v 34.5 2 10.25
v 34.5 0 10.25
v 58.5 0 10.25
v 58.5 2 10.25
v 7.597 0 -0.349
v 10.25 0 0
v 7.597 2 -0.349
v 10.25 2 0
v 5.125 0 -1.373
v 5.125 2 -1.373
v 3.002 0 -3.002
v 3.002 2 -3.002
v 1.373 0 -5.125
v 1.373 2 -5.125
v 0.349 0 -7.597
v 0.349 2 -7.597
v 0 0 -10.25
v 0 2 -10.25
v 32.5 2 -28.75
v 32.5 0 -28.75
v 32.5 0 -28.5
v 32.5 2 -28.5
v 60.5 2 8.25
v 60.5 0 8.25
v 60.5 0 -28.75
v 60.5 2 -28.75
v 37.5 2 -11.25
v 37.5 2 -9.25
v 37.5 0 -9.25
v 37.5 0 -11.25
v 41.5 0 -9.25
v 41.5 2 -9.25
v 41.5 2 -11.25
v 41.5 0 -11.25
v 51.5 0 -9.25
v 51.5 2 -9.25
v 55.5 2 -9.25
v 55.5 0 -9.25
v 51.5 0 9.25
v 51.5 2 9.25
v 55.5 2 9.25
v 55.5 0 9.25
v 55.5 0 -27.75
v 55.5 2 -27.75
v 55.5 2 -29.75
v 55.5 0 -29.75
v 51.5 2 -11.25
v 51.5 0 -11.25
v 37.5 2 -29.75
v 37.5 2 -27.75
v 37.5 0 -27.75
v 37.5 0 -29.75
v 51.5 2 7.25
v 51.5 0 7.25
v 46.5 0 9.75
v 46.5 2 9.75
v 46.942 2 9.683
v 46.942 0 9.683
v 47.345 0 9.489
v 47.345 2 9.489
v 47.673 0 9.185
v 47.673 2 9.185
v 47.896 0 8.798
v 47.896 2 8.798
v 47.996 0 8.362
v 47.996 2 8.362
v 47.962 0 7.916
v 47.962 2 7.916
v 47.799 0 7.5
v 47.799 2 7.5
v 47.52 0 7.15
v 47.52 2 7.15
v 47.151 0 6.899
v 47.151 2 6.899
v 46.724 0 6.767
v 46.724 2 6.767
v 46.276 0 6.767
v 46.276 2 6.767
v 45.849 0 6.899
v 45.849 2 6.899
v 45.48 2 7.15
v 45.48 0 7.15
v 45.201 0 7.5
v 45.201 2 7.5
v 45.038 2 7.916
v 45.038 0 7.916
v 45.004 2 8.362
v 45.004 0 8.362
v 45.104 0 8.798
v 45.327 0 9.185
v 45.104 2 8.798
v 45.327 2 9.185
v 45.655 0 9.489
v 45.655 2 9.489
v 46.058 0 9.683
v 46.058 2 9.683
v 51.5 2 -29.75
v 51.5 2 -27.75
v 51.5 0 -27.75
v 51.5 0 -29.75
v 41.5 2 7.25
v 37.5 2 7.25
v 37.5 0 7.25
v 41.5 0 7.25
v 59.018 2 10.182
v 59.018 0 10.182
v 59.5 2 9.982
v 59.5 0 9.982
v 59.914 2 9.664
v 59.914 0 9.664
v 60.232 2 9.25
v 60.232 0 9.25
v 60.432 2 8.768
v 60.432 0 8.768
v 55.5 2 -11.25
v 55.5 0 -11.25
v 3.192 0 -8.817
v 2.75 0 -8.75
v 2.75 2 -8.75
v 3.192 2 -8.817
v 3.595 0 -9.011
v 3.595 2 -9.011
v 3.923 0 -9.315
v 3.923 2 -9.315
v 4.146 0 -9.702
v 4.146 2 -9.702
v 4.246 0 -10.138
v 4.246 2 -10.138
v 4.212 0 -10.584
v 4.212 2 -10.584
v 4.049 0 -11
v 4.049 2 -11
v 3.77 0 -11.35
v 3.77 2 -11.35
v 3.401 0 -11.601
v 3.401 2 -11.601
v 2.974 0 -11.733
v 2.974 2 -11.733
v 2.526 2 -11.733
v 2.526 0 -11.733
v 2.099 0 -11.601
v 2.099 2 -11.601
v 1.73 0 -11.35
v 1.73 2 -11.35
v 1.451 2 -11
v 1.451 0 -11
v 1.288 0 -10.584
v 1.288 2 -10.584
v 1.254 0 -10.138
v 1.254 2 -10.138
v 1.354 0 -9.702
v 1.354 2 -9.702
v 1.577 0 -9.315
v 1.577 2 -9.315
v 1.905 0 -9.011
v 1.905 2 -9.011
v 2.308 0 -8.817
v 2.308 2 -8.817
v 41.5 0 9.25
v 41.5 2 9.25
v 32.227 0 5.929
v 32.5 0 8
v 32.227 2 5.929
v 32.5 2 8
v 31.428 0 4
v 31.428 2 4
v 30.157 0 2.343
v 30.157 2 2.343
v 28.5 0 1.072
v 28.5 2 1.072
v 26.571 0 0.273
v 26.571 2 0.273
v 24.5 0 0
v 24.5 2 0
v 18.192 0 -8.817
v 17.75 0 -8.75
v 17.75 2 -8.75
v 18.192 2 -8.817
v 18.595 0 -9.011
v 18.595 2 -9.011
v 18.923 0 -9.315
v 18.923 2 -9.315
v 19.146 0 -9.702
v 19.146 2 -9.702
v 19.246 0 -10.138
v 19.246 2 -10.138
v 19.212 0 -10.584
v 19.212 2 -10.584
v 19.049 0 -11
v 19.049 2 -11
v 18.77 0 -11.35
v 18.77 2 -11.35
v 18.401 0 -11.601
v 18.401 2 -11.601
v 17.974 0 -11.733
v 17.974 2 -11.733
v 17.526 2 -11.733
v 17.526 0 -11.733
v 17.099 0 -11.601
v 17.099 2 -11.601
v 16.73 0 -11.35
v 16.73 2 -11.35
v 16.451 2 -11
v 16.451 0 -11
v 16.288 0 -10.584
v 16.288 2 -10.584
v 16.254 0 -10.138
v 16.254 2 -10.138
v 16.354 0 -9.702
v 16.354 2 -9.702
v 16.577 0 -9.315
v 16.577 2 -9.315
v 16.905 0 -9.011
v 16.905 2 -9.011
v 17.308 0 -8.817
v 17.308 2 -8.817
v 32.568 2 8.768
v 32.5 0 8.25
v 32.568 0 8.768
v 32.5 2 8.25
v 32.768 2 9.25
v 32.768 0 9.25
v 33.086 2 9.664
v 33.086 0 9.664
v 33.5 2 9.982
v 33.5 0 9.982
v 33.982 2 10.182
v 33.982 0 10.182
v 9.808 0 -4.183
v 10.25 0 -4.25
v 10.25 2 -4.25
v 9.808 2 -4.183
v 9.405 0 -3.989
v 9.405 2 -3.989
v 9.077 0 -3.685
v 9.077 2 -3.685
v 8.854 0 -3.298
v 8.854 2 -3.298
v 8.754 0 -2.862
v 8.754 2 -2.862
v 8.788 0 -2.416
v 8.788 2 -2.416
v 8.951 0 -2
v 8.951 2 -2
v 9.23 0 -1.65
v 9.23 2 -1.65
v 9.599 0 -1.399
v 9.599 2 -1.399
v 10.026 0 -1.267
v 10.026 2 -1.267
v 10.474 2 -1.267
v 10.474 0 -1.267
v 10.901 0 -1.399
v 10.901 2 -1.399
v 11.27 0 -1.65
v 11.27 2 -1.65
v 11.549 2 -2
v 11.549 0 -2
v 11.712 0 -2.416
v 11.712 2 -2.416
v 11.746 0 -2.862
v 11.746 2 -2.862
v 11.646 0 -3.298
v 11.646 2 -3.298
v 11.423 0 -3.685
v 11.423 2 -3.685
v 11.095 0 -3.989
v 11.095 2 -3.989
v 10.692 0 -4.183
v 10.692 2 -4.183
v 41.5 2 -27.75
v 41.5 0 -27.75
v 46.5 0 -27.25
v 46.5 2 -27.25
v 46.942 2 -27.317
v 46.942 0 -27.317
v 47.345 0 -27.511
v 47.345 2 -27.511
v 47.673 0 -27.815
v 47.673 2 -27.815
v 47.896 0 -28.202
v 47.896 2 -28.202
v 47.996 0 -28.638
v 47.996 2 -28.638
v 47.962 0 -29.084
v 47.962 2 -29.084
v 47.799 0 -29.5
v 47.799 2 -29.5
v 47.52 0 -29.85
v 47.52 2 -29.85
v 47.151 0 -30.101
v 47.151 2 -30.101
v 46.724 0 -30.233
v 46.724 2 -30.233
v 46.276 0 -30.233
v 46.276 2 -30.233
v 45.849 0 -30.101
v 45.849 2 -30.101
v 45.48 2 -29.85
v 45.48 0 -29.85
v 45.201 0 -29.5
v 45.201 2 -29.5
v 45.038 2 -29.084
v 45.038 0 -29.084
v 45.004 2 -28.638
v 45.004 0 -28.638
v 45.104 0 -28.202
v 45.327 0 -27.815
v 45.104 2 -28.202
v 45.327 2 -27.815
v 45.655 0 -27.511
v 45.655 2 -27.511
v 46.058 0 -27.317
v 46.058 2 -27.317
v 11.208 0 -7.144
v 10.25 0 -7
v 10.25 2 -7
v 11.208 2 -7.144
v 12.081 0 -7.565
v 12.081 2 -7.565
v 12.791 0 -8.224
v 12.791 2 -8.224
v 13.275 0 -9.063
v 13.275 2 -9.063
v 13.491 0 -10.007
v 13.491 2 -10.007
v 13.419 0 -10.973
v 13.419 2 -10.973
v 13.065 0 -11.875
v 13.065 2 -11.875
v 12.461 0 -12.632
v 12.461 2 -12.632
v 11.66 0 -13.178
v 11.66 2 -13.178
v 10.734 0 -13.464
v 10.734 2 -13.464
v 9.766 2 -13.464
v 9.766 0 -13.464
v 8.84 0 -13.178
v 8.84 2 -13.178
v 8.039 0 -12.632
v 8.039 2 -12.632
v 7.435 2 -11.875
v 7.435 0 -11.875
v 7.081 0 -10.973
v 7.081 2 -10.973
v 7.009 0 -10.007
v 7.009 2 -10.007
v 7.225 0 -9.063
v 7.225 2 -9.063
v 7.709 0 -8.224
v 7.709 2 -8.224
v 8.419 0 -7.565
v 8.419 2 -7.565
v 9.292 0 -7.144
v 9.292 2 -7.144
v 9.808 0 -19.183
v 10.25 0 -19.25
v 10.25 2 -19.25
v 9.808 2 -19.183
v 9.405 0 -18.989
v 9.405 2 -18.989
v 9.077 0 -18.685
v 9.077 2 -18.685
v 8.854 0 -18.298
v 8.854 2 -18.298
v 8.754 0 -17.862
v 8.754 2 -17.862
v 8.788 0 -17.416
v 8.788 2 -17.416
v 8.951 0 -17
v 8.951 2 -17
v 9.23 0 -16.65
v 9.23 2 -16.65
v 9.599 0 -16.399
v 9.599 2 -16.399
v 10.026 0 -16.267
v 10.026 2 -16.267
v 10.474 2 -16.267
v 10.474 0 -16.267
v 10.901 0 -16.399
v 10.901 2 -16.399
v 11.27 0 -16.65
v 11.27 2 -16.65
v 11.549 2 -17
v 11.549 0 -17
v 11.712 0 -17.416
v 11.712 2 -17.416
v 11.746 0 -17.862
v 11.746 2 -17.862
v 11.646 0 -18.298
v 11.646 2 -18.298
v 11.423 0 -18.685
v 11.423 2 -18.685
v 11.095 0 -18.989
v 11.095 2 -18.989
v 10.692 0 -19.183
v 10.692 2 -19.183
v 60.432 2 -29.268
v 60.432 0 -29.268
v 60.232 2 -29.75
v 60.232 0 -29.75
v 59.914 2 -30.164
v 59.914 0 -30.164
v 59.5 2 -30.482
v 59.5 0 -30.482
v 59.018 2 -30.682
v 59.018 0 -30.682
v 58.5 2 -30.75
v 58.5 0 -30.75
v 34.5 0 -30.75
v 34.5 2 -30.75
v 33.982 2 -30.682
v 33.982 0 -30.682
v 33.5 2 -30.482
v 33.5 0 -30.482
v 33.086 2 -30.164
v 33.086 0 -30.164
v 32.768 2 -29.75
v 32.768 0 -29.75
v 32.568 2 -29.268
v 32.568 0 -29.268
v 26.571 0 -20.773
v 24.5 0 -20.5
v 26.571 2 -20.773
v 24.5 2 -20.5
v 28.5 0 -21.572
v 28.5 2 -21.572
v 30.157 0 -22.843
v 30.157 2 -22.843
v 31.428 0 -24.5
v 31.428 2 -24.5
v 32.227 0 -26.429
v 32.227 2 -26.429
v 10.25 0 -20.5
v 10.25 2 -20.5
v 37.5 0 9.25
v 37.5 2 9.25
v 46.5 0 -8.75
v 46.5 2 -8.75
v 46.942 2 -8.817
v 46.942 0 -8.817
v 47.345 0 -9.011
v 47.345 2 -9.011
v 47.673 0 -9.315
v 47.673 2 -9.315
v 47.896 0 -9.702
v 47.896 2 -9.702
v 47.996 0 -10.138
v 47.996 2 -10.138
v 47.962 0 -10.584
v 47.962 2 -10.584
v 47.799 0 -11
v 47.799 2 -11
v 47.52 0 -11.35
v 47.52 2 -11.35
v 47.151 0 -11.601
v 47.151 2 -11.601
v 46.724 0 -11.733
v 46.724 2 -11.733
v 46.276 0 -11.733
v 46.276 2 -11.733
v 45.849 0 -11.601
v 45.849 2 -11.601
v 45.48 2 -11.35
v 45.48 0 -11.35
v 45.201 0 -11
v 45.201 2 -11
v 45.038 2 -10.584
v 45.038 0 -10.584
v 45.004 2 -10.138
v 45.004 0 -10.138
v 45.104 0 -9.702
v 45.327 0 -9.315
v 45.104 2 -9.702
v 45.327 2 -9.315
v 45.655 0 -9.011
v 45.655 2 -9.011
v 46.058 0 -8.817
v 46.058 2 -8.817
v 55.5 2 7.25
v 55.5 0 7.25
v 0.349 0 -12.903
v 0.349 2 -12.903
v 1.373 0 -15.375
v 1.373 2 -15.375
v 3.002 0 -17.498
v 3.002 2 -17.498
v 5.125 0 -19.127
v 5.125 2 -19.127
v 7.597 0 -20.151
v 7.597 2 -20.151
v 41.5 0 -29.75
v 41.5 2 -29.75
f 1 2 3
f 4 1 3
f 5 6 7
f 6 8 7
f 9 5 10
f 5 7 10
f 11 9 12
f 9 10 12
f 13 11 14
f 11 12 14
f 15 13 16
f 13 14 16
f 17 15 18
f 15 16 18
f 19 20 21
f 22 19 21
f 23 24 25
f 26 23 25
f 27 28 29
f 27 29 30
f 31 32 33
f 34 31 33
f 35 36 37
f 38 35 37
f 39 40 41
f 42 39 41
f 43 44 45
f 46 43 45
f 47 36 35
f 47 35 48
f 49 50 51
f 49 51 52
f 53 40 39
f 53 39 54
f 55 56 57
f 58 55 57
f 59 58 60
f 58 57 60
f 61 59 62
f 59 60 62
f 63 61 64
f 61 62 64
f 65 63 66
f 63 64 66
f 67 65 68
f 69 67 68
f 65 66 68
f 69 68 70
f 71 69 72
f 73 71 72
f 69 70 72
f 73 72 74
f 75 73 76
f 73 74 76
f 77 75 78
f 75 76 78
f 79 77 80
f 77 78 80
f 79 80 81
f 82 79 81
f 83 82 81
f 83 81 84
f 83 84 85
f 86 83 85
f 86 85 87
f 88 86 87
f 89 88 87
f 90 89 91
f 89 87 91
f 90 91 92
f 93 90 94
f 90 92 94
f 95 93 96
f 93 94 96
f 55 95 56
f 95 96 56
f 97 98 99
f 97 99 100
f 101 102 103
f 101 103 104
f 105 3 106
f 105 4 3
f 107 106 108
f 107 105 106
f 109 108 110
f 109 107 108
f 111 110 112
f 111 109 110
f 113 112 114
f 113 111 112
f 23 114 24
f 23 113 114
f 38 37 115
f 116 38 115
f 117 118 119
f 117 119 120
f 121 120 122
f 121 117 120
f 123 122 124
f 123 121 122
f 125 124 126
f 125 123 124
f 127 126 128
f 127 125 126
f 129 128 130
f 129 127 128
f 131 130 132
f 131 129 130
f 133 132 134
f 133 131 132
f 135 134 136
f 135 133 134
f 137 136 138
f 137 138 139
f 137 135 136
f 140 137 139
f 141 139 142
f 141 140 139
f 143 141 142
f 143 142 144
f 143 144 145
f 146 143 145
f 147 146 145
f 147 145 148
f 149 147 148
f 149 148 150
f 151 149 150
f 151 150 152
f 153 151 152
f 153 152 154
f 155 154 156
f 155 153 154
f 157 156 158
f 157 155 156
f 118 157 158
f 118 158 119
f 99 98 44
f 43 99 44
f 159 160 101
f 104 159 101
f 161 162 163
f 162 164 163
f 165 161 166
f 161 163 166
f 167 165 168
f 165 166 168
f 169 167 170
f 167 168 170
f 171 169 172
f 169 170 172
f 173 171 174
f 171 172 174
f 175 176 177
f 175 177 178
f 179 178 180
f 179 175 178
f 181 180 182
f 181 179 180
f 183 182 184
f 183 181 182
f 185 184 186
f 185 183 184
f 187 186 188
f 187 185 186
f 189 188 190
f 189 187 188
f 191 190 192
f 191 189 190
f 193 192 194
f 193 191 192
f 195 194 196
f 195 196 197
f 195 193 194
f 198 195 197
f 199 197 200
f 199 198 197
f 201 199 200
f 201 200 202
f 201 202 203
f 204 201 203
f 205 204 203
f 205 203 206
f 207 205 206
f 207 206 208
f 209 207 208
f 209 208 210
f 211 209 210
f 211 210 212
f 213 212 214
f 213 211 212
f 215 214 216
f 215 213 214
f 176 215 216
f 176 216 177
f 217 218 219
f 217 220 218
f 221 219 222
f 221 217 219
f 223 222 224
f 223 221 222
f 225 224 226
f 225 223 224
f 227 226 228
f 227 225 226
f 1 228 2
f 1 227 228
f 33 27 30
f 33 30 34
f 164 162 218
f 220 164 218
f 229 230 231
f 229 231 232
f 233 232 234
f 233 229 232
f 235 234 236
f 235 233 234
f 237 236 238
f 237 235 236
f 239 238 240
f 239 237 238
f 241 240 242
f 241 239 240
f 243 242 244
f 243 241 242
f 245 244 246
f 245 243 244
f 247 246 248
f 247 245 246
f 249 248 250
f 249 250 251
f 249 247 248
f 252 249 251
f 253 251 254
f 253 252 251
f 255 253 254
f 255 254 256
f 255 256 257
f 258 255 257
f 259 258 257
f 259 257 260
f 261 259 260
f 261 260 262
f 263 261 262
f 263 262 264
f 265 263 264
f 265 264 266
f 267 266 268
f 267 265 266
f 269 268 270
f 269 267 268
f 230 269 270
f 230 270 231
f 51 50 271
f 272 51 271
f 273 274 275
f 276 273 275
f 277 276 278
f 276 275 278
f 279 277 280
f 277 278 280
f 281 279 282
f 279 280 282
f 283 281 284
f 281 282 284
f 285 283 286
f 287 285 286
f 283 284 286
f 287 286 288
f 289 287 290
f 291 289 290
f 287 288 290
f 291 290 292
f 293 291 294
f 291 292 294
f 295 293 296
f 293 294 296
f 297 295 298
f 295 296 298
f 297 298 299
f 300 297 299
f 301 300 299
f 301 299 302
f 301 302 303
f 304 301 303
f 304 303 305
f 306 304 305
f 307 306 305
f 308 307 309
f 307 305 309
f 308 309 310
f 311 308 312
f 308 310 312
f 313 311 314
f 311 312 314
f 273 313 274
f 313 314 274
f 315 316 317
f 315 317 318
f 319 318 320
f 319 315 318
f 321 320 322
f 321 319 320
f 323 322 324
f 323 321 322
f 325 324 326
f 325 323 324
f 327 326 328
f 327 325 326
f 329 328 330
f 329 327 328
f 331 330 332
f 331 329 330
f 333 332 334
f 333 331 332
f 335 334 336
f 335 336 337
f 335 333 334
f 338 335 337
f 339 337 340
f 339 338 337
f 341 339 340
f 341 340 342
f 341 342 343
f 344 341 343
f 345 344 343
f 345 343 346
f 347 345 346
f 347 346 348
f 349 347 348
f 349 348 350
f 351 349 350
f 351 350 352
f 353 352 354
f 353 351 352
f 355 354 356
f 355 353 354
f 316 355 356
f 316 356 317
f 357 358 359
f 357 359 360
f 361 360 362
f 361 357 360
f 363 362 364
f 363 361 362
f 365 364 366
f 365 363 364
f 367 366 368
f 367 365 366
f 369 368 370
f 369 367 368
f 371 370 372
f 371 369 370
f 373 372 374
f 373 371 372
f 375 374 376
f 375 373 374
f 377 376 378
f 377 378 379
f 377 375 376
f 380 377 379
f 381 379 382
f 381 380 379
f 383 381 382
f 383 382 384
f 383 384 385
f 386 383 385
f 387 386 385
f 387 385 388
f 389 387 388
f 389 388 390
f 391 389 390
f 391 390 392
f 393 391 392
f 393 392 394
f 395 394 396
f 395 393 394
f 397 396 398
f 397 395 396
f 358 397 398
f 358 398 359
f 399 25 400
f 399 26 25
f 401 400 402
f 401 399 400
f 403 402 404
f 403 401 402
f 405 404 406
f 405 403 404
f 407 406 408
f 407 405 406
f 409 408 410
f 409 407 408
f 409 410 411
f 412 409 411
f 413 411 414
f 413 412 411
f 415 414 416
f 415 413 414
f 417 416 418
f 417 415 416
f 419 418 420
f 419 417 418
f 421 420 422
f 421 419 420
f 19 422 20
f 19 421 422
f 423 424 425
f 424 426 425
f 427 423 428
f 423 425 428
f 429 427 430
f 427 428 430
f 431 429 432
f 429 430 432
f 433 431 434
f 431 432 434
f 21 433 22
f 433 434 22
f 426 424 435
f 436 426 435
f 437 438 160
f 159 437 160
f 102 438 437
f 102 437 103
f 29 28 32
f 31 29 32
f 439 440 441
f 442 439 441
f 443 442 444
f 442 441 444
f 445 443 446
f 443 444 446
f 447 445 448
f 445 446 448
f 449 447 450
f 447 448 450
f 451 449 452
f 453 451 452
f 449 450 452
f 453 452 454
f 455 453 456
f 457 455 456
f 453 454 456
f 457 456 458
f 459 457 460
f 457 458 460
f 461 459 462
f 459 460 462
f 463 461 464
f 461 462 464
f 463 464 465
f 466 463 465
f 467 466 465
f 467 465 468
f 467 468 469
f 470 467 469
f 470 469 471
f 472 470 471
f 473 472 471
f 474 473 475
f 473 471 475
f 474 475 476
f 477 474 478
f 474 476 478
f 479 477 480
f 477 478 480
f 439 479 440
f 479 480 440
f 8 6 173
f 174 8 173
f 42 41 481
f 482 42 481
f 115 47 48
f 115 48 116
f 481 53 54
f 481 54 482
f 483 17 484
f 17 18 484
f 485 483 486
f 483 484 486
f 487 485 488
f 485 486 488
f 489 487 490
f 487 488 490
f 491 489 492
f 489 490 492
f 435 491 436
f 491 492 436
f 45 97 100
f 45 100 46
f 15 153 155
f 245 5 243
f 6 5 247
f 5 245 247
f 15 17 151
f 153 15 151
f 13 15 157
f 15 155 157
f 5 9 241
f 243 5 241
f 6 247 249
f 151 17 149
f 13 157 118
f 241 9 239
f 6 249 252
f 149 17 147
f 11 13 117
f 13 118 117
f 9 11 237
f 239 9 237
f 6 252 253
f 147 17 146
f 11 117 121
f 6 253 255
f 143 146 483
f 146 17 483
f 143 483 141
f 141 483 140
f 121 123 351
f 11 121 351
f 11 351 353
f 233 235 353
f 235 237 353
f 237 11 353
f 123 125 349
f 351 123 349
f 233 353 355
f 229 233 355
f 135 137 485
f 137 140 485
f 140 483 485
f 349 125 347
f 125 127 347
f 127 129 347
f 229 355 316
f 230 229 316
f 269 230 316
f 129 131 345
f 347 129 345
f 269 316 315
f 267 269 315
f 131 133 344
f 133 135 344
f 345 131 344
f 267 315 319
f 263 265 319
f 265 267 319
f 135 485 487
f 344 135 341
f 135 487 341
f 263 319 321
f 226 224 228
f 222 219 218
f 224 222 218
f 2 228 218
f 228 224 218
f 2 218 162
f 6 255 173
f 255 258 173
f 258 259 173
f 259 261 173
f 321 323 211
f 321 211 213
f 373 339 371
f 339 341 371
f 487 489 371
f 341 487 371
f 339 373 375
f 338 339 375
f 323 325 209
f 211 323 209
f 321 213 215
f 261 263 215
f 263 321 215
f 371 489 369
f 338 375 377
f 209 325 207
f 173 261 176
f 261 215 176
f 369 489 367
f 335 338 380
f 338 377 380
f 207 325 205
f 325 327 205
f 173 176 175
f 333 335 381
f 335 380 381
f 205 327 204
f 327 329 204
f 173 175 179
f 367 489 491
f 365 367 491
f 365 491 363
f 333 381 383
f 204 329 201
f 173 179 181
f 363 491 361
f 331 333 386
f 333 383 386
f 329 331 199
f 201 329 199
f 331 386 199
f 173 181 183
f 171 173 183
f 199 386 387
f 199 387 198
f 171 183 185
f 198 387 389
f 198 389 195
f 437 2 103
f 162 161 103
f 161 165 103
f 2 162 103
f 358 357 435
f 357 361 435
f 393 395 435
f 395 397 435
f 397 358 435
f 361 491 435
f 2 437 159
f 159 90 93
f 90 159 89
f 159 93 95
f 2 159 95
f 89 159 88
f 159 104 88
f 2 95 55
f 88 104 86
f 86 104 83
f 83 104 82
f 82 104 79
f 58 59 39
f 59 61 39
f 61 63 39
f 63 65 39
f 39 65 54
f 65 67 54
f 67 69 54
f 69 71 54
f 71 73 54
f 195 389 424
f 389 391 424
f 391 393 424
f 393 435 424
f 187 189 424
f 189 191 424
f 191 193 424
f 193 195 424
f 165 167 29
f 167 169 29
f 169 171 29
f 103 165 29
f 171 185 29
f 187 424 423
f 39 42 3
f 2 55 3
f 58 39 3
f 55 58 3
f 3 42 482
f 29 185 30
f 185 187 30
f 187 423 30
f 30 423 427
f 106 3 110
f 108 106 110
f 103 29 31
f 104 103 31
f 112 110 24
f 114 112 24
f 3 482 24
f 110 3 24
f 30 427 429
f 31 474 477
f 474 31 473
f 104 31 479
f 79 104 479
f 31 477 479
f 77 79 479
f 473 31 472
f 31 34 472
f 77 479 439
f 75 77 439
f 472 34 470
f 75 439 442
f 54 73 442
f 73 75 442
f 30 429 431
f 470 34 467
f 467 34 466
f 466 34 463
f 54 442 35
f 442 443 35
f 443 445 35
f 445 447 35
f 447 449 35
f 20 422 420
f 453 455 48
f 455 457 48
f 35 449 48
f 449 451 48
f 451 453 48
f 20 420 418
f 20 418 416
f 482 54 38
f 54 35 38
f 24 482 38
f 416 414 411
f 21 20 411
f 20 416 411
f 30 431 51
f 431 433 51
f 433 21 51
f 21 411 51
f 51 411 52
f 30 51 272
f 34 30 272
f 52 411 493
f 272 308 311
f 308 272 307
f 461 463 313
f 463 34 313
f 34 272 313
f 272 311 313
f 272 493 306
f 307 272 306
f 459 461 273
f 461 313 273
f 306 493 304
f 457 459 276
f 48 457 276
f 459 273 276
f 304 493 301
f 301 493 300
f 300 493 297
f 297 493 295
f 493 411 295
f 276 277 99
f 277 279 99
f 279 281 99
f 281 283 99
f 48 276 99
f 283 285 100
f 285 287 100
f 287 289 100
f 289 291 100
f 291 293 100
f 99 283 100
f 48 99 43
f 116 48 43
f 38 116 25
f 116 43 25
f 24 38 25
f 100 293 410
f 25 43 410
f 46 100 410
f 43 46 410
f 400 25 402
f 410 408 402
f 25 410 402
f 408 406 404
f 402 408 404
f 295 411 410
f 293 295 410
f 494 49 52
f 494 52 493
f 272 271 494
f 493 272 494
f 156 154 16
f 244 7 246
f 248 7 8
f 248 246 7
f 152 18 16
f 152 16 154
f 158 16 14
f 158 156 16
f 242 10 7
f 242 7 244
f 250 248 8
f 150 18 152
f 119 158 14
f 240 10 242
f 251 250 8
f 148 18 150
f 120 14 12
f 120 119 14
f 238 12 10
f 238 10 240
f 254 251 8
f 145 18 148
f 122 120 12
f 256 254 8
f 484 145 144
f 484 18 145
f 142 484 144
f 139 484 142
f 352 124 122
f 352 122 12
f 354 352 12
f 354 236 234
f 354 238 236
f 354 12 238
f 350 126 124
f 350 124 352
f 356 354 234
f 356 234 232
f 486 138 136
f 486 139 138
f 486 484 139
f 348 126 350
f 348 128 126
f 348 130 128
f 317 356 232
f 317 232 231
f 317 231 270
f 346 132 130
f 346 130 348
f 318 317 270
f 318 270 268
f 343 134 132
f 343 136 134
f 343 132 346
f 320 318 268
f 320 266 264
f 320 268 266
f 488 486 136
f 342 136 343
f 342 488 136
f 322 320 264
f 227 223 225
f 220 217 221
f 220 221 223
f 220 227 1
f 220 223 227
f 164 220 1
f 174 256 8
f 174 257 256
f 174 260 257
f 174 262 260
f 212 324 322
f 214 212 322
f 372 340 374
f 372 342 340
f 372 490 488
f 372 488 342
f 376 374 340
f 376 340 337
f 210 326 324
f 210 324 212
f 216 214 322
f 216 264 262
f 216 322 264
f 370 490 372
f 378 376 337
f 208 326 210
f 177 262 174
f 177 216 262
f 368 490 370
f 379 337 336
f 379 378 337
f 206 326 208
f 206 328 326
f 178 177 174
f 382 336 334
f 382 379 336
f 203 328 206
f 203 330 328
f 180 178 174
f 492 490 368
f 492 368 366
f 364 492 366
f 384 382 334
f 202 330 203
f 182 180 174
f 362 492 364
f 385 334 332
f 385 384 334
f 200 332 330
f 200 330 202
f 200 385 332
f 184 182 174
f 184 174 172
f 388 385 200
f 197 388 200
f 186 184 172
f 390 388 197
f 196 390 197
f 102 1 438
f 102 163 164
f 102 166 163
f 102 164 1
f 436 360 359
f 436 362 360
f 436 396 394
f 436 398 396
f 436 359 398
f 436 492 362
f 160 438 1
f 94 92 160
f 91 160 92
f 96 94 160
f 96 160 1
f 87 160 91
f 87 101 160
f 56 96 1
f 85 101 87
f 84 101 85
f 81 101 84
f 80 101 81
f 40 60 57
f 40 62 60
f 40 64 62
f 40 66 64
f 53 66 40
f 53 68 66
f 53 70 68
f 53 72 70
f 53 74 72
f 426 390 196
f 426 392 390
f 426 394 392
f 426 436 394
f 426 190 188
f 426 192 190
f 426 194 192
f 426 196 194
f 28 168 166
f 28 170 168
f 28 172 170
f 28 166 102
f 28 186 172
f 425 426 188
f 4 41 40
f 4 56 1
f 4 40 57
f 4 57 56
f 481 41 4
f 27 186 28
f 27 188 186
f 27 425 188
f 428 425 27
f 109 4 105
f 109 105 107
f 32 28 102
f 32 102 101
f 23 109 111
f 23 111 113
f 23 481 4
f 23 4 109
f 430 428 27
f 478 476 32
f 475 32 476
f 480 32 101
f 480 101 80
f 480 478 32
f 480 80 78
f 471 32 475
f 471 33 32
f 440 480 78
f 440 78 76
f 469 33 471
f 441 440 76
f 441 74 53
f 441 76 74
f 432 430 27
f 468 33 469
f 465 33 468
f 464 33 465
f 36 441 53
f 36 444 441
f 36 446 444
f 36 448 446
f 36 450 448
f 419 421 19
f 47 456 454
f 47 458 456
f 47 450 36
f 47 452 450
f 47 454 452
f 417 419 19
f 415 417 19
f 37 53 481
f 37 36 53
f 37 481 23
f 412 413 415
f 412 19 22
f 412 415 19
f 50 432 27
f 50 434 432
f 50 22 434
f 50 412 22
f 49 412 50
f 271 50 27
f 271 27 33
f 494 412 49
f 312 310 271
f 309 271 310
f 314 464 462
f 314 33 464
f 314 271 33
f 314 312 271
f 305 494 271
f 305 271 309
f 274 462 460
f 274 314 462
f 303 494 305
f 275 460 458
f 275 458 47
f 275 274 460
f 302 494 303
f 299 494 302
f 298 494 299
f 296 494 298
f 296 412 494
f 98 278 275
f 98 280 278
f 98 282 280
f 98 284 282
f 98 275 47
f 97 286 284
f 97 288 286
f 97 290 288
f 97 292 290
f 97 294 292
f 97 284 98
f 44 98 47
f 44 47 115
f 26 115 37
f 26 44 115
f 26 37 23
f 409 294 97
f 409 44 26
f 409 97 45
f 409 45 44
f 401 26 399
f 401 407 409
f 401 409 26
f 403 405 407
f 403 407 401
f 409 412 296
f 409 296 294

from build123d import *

# Parameters (mm, degrees)
SKETCH1_R           = 3.25
SKETCH1_R_2         = 1.5
BOSS_EXTRUDE1_DEPTH = 2
FILLET1_R           = 10.25
FILLET2_R           = 2
SKETCH2_R           = 1.5
SKETCH2_W           = 4
SKETCH2_H           = 2
CUT_EXTRUDE1_DEPTH  = 2
FILLET3_R           = 8


with BuildPart() as part:
    # Sketch1 → Boss-Extrude1 (new body)
    with BuildSketch(Plane(origin=(0, 0, 0), x_dir=(1, 0, 0), z_dir=(0, 1, 0))):
        Polygon((0, 0), (32.5, 0), (32.5, -10.25), (60.5, -10.25), (60.5, -0.75), (60.5, 21.25), (60.5, 30.75), (32.5, 30.75), (32.5, 20.5), (0, 20.5), align=None)
        with Locations(Location((10.25, 10.25, 0), (0, 0, 270))):
            Circle(SKETCH1_R, mode=Mode.SUBTRACT)
        with Locations(Location((2.75, 10.25, 0), (0, 0, 270))):
            Circle(SKETCH1_R_2, mode=Mode.SUBTRACT)
        with Locations(Location((10.25, 17.75, 0), (0, 0, 90))):
            Circle(SKETCH1_R_2, mode=Mode.SUBTRACT)
        with Locations(Location((17.75, 10.25, 0), (0, 0, 270))):
            Circle(SKETCH1_R_2, mode=Mode.SUBTRACT)
        with Locations(Location((10.25, 2.75, 0), (0, 0, 90))):
            Circle(SKETCH1_R_2, mode=Mode.SUBTRACT)
    extrude(amount=BOSS_EXTRUDE1_DEPTH)

    # Fillet1
    fillet1_edges = [part.edges().sort_by_distance(p)[0] for p in [
        (0, 1, -20.5),
        (0, 1, 0),
    ]]
    fillet(fillet1_edges, radius=FILLET1_R - 0.0001)  # a hair under: the kernel refuses the full size

    # Fillet2
    fillet2_edges = [part.edges().sort_by_distance(p)[0] for p in [
        (32.5, 1, -30.75),
        (60.5, 1, -30.75),
        (60.5, 1, 10.25),
        (32.5, 1, 10.25),
    ]]
    fillet(fillet2_edges, radius=FILLET2_R)

    # Sketch2 → Cut-Extrude1 (cut)
    with BuildSketch(Plane(origin=(0, 2, 0), x_dir=(1, 0, 0), z_dir=(0, 1, 0))):
        with Locations(Location((46.5, 28.75, 0), (0, 0, 270))):
            Circle(SKETCH2_R)
        with Locations(Location((46.5, 10.25, 0), (0, 0, 270))):
            Circle(SKETCH2_R)
        with Locations(Location((46.5, -8.25, 0), (0, 0, 270))):
            Circle(SKETCH2_R)
        with Locations((39.5, 28.75)):
            Rectangle(SKETCH2_W, SKETCH2_H)
        with Locations((53.5, 28.75)):
            Rectangle(SKETCH2_W, SKETCH2_H)
        with Locations((39.5, 10.25)):
            Rectangle(SKETCH2_W, SKETCH2_H)
        with Locations((53.5, 10.25)):
            Rectangle(SKETCH2_W, SKETCH2_H)
        with Locations((39.5, -8.25)):
            Rectangle(SKETCH2_W, SKETCH2_H)
        with Locations((53.5, -8.25)):
            Rectangle(SKETCH2_W, SKETCH2_H)
    extrude(amount=-CUT_EXTRUDE1_DEPTH, mode=Mode.SUBTRACT)

    # Fillet3
    fillet3_edges = [part.edges().sort_by_distance(p)[0] for p in [
        (32.5, 1, -20.5),
        (32.5, 1, 0),
    ]]
    fillet(fillet3_edges, radius=FILLET3_R)


solid = part.part
